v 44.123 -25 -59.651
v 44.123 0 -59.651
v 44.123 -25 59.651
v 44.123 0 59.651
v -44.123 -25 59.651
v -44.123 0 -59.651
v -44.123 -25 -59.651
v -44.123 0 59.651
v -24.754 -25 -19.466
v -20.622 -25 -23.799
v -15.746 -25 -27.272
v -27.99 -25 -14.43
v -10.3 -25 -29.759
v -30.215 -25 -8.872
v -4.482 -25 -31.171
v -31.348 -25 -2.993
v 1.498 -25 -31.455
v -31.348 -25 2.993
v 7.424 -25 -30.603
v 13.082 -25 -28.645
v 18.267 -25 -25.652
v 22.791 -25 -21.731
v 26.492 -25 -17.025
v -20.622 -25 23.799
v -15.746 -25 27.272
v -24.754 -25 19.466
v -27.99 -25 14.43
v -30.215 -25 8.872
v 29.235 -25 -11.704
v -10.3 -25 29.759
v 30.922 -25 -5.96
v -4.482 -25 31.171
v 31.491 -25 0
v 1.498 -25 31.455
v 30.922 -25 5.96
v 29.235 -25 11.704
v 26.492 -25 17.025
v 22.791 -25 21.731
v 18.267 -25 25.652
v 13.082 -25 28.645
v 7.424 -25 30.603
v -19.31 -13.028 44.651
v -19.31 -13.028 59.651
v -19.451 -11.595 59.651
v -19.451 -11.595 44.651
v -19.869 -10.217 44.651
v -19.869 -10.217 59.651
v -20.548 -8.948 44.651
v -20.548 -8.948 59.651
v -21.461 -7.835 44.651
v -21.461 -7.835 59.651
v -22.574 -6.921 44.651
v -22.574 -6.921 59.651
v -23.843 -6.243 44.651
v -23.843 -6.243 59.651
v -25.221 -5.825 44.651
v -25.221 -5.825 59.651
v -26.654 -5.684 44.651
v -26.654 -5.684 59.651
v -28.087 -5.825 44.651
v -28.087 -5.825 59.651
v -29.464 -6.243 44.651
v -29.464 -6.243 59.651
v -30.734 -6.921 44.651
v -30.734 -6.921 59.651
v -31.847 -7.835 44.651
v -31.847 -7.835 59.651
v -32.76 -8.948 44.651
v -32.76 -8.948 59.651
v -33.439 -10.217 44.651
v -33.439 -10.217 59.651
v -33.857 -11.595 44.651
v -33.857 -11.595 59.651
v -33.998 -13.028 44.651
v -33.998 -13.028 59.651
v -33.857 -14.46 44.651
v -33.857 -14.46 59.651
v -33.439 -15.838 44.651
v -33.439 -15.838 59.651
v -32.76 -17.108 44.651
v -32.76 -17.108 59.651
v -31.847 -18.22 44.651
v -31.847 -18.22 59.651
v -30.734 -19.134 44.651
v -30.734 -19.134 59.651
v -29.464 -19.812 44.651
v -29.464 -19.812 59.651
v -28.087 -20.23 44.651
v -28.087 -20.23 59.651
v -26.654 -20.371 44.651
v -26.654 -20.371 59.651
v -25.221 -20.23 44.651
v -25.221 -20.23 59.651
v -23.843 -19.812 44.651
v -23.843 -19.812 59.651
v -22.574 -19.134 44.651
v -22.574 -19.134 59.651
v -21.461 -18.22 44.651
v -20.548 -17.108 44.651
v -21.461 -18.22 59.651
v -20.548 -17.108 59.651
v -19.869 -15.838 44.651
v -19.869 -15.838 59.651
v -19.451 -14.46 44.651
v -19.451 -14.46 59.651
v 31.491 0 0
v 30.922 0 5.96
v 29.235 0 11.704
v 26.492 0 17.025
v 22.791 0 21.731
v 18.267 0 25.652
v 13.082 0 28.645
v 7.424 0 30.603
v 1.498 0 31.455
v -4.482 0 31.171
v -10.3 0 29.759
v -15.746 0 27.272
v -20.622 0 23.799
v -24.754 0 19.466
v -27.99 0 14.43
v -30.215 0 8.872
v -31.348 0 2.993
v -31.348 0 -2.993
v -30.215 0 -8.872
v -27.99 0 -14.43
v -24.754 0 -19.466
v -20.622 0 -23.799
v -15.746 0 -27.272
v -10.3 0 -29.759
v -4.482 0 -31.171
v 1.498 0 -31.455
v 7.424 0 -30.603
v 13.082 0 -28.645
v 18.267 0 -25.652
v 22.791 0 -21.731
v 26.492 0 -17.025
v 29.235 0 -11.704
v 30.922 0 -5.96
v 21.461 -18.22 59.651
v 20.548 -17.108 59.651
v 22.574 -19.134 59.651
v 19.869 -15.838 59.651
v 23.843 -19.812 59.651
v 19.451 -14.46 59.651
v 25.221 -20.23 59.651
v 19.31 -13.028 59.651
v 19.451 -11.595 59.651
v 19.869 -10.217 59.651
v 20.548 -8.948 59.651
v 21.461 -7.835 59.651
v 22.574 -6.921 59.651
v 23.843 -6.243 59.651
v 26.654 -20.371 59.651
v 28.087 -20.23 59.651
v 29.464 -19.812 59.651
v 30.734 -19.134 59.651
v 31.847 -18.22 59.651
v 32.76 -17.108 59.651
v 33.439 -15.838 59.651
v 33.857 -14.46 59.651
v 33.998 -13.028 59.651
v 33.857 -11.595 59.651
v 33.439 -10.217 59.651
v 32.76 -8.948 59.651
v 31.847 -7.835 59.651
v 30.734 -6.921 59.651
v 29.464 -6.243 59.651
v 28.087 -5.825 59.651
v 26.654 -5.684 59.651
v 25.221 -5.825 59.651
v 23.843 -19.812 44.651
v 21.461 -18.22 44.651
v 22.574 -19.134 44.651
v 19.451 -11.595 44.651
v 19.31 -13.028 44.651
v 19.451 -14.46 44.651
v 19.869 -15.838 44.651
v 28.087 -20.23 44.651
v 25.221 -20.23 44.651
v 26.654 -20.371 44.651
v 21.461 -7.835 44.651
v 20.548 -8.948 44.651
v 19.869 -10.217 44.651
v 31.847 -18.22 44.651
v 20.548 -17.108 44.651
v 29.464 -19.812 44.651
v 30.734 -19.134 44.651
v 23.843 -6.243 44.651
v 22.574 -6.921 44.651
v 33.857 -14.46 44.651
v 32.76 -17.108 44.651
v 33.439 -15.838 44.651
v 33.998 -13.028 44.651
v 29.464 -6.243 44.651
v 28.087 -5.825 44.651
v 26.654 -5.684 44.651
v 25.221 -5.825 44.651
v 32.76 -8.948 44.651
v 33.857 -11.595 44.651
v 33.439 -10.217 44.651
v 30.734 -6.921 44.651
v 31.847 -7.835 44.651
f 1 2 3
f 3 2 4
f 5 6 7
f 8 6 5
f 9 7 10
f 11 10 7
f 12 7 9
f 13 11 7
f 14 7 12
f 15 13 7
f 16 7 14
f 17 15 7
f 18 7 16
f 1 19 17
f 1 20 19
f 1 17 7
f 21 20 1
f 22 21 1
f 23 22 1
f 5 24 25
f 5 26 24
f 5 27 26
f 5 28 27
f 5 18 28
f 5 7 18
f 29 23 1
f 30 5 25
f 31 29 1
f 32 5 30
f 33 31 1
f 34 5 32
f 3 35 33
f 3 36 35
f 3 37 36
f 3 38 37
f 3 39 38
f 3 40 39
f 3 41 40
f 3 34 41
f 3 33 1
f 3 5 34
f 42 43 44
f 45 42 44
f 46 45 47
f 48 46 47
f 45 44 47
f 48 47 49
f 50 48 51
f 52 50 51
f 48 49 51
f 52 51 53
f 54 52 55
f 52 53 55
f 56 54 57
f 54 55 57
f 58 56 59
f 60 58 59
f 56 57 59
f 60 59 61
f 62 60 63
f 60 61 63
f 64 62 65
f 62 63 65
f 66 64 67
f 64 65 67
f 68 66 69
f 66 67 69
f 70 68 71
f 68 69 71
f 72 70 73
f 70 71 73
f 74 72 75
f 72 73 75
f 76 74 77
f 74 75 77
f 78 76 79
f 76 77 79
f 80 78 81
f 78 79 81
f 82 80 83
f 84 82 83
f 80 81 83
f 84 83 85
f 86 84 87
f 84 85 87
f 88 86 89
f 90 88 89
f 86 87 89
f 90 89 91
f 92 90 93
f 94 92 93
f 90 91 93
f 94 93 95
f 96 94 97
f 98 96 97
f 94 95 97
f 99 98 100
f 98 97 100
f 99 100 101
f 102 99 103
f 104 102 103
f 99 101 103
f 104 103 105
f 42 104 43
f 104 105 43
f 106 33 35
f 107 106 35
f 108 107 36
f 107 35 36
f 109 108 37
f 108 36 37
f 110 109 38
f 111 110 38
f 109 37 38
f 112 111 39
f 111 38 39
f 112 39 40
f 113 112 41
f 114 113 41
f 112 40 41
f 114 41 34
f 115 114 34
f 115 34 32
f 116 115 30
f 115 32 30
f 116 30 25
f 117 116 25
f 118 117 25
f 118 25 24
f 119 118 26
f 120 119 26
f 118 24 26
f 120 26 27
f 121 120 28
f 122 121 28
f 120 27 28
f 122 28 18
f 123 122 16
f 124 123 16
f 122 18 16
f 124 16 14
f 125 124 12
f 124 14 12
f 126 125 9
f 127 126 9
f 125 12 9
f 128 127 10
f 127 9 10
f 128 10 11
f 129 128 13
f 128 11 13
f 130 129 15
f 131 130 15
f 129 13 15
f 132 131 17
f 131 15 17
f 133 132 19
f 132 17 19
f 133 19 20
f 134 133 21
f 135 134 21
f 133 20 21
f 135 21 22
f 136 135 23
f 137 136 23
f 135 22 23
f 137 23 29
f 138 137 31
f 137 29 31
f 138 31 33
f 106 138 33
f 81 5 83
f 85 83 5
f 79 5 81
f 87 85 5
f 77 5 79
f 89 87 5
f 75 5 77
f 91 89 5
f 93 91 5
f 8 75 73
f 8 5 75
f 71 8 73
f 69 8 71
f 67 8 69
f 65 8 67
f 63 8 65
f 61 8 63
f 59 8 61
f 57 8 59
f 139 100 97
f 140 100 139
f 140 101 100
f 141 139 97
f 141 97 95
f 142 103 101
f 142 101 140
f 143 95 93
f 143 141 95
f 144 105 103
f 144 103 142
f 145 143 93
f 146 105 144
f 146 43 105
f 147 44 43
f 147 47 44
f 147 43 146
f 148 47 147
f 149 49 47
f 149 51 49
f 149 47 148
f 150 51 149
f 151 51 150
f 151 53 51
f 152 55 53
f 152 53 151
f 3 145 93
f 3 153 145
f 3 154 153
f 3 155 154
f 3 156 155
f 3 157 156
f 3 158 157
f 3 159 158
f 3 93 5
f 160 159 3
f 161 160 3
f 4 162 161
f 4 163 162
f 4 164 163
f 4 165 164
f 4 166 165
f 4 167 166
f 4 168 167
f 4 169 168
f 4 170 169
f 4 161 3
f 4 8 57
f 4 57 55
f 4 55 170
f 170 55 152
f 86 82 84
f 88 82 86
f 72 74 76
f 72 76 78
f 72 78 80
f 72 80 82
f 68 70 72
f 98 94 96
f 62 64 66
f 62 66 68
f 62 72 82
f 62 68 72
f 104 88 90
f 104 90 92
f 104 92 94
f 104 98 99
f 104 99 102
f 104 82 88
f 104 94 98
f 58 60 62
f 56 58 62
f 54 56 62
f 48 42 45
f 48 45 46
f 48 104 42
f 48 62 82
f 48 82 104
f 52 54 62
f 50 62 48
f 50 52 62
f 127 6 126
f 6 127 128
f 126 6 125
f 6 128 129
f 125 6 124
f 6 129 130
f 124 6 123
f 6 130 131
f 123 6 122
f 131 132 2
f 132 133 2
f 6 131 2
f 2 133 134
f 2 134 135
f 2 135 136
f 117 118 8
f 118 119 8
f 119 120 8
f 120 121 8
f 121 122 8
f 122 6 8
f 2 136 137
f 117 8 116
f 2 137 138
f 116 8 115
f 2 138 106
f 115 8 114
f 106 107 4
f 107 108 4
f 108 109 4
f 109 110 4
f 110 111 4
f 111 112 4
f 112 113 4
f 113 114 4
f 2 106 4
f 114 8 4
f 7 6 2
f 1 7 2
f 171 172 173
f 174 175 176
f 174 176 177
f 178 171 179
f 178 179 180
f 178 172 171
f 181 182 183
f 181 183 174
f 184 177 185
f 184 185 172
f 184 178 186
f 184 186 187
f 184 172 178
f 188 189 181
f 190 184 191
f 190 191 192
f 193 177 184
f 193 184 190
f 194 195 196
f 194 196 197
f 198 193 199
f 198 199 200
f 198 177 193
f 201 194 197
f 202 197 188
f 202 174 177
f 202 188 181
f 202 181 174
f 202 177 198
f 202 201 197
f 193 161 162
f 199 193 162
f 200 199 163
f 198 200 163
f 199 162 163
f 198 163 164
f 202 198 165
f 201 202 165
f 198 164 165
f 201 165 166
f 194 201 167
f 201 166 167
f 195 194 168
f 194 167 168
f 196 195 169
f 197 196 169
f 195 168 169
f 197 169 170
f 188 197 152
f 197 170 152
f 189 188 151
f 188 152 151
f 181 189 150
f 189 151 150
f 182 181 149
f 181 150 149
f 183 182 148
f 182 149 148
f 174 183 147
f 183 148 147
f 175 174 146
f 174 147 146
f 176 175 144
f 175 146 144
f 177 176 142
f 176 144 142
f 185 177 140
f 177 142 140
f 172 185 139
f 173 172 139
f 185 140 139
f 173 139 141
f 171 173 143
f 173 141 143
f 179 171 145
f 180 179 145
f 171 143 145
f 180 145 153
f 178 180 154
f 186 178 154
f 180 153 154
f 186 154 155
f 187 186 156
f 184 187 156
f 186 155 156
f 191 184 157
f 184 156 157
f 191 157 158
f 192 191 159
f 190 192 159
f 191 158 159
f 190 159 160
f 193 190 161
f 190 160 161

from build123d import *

# Parameters (mm, degrees)
F0_W     = 88.246942
F0_H     = 119.301722
F1_DEPTH = 25
F3_R     = 7.34388
F4_DEPTH = 15
F2_R     = 31.491044
F5_DEPTH = 25


with BuildPart() as f1:
    # F0 (on Front) → F1 (new body)
    with BuildSketch(Plane.XZ):
        Rectangle(F0_W, F0_H)
    extrude(amount=F1_DEPTH)

    # F3 (on face) → F4 (cut)
    with BuildSketch(Plane.XY.offset(59.650861)):
        with Locations((-26.653793, -13.027571)):
            Circle(F3_R)
        with Locations((26.653793, -13.027571)):
            Circle(F3_R)
    extrude(amount=-F4_DEPTH, mode=Mode.SUBTRACT)

    # F2 (on face) → F5 (cut, through all)
    with BuildSketch(Plane.XZ.offset(25)):
        Circle(F2_R)
    extrude(amount=-F5_DEPTH, mode=Mode.SUBTRACT)


solid = f1.part
